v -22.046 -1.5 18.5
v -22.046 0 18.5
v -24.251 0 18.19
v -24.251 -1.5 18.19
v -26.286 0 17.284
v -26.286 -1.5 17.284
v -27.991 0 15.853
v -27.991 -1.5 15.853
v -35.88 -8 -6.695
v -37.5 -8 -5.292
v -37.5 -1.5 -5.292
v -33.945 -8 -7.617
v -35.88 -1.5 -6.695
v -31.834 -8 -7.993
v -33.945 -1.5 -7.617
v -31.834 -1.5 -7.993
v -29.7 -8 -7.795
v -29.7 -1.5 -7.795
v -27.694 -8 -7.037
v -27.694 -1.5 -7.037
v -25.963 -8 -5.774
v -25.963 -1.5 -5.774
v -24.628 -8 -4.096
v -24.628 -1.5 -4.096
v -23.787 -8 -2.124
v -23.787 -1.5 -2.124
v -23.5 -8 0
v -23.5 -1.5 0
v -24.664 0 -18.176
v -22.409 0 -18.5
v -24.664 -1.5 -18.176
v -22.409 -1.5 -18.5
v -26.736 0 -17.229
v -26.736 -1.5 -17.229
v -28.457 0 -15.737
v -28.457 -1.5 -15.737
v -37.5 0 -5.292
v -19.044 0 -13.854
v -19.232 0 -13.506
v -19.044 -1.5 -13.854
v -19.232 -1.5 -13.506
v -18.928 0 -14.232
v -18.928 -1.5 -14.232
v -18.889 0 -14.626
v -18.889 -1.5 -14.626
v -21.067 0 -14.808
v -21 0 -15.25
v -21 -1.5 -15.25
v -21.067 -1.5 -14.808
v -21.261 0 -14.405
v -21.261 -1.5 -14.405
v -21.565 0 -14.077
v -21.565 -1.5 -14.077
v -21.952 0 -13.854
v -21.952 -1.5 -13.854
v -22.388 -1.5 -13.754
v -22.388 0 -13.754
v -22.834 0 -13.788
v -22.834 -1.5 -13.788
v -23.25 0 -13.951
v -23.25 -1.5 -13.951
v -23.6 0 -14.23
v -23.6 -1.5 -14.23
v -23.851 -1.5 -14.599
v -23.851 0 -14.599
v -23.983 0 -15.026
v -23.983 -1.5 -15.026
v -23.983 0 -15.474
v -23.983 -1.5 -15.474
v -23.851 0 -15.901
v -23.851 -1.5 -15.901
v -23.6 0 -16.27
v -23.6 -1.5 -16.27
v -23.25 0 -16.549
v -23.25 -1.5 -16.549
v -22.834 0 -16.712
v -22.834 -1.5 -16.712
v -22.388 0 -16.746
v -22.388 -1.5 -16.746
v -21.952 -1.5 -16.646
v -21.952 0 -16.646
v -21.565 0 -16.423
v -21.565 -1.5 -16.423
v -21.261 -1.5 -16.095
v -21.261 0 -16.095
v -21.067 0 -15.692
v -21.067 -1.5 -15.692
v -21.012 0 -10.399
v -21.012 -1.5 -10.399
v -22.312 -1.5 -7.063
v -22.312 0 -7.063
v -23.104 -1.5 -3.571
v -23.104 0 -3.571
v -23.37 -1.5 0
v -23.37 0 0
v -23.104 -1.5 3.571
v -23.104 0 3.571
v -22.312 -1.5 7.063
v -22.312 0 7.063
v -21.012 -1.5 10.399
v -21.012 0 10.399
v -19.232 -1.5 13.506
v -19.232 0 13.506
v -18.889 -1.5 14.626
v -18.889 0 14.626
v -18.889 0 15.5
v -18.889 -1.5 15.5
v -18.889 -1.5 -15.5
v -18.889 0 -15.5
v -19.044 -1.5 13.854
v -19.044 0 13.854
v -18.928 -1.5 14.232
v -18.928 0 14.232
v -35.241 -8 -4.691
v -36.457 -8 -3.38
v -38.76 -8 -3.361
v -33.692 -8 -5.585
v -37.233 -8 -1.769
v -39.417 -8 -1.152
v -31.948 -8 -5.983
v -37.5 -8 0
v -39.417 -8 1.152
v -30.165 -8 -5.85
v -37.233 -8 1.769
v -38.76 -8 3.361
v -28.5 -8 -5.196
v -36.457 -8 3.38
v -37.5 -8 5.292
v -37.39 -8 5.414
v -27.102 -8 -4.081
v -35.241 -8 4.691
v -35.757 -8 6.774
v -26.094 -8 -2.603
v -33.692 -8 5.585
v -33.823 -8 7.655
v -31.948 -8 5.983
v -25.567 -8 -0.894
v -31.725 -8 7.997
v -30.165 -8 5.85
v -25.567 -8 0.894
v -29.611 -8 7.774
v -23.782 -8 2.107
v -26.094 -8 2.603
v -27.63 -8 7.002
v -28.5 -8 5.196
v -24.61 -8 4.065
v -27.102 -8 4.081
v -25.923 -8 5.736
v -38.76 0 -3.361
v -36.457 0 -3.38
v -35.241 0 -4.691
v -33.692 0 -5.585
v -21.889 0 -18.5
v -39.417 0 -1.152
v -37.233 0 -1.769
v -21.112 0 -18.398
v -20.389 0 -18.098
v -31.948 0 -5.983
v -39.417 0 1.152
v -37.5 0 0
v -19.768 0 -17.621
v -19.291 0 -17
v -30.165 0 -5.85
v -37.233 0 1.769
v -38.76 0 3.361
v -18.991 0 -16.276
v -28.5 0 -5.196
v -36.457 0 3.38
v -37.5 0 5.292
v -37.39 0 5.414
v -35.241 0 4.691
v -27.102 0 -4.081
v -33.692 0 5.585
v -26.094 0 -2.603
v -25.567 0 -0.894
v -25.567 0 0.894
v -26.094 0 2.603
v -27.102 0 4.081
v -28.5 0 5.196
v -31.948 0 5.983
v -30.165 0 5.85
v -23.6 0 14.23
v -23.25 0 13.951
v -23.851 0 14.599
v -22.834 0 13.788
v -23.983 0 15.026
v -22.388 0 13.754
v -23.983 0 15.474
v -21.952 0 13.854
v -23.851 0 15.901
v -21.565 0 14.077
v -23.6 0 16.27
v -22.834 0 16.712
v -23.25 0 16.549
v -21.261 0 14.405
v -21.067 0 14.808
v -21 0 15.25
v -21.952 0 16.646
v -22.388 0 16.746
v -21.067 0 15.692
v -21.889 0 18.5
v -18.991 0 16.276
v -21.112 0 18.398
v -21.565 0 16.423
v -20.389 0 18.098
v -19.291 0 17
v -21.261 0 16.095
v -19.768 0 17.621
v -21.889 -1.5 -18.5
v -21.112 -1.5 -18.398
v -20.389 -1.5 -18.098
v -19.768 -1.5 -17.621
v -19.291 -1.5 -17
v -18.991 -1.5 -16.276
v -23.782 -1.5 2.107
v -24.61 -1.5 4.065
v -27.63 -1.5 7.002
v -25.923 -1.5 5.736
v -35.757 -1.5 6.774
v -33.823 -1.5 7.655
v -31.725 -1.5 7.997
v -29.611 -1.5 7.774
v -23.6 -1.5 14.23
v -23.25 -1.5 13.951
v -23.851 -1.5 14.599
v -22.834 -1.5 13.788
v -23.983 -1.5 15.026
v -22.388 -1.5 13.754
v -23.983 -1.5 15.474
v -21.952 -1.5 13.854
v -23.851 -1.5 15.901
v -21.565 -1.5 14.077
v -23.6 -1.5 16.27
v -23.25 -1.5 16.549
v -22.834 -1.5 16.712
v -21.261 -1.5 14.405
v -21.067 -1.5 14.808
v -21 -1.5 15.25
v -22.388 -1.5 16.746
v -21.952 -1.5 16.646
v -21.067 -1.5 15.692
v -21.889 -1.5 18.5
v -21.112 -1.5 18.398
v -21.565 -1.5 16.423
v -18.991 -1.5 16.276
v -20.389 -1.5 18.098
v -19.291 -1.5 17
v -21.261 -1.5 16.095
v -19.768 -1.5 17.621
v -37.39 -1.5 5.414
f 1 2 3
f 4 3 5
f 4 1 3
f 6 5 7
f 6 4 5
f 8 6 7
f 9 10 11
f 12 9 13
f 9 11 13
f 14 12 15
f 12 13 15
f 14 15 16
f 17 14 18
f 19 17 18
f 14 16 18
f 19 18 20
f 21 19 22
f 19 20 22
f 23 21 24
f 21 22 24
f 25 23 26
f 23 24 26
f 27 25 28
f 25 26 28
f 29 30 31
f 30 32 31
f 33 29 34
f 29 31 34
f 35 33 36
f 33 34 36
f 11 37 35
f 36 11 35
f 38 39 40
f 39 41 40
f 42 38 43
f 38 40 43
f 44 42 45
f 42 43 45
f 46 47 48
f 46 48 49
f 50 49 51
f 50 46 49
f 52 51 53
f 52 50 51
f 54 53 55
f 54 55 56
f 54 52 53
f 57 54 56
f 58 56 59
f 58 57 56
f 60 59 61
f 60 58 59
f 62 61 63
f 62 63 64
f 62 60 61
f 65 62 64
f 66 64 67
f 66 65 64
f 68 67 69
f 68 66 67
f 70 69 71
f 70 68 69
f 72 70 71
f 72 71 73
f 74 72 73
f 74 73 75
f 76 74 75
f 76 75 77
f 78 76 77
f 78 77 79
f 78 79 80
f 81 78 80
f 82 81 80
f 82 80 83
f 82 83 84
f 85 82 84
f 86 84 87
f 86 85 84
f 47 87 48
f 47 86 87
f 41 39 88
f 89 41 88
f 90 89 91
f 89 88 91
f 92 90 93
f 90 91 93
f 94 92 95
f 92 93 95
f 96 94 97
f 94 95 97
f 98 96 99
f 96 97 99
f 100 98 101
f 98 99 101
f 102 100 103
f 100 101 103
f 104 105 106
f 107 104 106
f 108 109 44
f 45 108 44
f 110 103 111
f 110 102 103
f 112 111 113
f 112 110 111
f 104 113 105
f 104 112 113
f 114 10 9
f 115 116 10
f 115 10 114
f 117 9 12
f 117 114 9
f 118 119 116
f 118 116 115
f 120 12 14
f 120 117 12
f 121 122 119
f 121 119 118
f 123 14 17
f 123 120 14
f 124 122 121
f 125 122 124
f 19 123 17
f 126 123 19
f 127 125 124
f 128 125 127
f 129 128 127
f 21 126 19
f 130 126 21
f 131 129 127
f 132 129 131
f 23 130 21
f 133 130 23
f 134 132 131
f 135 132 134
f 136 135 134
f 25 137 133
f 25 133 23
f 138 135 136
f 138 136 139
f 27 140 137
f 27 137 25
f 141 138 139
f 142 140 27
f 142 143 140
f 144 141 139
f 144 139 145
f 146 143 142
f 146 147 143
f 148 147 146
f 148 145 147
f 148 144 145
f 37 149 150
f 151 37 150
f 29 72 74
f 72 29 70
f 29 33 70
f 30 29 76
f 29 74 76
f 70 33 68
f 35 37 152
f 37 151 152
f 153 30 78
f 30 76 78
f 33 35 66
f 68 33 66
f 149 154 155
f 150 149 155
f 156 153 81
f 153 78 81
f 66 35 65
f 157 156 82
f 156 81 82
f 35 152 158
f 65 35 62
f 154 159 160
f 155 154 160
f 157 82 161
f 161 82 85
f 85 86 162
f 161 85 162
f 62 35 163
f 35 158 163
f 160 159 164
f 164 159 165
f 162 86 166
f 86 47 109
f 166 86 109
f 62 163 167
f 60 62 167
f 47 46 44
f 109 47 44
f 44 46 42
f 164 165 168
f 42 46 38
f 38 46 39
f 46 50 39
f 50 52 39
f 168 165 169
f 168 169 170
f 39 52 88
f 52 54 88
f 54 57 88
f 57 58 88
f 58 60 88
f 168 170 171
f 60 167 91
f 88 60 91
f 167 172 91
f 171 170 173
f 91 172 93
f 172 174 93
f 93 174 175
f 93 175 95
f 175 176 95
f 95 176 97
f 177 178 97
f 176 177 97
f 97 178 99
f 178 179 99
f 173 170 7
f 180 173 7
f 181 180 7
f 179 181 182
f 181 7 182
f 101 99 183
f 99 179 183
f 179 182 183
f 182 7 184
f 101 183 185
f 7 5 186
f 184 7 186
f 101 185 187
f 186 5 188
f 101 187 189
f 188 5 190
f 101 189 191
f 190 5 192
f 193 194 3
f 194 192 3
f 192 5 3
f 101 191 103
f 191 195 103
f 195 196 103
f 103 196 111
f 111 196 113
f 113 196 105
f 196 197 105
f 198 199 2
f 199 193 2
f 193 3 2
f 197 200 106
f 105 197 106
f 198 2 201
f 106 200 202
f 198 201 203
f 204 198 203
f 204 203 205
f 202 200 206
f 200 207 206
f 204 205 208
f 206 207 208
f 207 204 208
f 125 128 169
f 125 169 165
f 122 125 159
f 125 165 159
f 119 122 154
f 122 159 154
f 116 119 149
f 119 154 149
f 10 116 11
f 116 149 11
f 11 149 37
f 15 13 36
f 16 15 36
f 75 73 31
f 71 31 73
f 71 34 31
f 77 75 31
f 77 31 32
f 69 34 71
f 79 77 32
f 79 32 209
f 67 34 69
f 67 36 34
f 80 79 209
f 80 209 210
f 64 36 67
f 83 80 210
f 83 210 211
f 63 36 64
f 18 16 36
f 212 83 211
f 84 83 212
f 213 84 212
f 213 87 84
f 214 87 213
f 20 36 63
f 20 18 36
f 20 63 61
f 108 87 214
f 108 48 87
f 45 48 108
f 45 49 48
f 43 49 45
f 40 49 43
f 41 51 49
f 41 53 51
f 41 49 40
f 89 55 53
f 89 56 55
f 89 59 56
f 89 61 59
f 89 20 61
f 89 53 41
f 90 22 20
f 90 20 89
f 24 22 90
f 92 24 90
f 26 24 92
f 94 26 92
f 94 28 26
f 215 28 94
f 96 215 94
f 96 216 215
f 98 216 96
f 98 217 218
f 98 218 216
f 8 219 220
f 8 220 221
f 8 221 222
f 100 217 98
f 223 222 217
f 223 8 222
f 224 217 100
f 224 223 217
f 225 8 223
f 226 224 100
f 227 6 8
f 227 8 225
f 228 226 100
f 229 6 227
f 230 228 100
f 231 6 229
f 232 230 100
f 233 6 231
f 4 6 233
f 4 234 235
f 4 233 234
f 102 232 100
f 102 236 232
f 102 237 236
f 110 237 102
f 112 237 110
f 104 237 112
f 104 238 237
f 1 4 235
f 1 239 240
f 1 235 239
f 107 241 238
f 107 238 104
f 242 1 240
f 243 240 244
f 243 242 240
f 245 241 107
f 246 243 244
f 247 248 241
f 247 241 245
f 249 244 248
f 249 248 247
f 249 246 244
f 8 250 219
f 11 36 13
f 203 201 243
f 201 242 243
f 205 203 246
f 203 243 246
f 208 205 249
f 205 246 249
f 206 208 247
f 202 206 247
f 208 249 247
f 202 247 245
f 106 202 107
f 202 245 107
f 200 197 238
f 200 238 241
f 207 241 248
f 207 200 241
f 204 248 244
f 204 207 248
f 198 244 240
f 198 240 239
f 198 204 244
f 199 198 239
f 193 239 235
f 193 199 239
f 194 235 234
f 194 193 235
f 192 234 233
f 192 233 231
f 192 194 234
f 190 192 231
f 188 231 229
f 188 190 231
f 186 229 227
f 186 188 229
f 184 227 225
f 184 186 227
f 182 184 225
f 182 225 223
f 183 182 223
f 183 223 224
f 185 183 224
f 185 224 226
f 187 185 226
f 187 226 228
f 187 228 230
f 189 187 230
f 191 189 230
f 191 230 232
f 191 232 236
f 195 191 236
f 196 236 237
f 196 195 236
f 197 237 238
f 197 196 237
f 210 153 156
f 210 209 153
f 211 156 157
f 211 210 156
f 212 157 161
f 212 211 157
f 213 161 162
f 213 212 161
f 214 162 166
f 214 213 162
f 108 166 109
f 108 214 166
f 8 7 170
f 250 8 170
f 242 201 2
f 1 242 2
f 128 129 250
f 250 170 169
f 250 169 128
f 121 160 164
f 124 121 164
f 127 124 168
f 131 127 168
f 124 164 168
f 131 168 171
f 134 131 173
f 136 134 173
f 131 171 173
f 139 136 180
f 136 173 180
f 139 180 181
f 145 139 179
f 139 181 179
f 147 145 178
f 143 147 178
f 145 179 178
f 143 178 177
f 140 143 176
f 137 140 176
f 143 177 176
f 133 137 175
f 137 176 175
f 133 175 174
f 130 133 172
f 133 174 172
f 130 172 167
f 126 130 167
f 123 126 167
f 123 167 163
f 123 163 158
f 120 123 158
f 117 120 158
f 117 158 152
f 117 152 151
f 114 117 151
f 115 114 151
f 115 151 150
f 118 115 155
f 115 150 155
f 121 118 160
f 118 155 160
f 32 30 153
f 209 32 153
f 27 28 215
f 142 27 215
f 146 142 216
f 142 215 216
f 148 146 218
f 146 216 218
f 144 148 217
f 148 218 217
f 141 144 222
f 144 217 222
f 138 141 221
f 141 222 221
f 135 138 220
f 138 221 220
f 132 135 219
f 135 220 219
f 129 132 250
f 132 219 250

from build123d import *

# Parameters (mm, degrees)
F0_R     = 1.5
F1_DEPTH = 1.5
F2_DEPTH = 8
F3_R     = 8
F4_R     = 3
F5_R     = 2
F6_R     = 8
F7_R     = 3
F8_R     = 2


with BuildPart() as f1:
    # F0 (on Front) → F1 (new body)
    with BuildSketch(Plane.XZ):
        with BuildLine():
            Line((-26.0642077774, -18.5), (-18.8888516277, -18.5))
            Line((-18.8888516277, -18.5), (-18.8888516277, -14))
            ThreePointArc((-18.8888516277, -14), (-23.3701047123, 0), (-18.8888516277, 14))
            Line((-18.8888516277, 14), (-18.8888516277, 18.5))
            Line((-18.8888516277, 18.5), (-25.6080199033, 18.5))
            Line((-25.6080199033, 18.5), (-37.3901407018, 5.4135240382))
            ThreePointArc((-37.3901407018, 5.4135240382), (-28.5949290555, 7.4538958141), (-23.5, 0))
            ThreePointArc((-23.5, 0), (-28.6715728753, -7.4833147735), (-37.5, -5.2915026221))
            Line((-37.5, -5.2915026221), (-37.5, -5.2920114501))
            Line((-37.5, -5.2920114501), (-26.0642077774, -18.5))
        make_face()
        with Locations((-22.5, -15.25)):
            Circle(F0_R, mode=Mode.SUBTRACT)
        with Locations((-22.5, 15.25)):
            Circle(F0_R, mode=Mode.SUBTRACT)
    extrude(amount=F1_DEPTH)

    # F0 (on Front) → F2 (join)
    with BuildSketch(Plane.XZ):
        with BuildLine():
            Line((-37.5, 0), (-37.5, -5.2915026221))
            ThreePointArc((-37.5, -5.2915026221), (-28.6715728753, -7.4833147735), (-23.5, 0))
            ThreePointArc((-23.5, 0), (-28.5949290555, 7.4538958141), (-37.3901407018, 5.4135240382))
            Line((-37.3901407018, 5.4135240382), (-37.5, 5.2915026221))
            Line((-37.5, 5.2915026221), (-37.5, 0))
        make_face()
        with BuildLine():
            ThreePointArc((-25.5, 0), (-31.5, -6), (-37.5, 0))
            ThreePointArc((-37.5, 0), (-31.5, 6), (-25.5, 0))
        make_face(mode=Mode.SUBTRACT)
        with BuildLine():
            ThreePointArc((-37.5, 5.2915026221), (-39.5, 0), (-37.5, -5.2915026221))
            Line((-37.5, -5.2915026221), (-37.5, 0))
            Line((-37.5, 0), (-37.5, 5.2915026221))
        make_face()
    extrude(amount=F2_DEPTH)

    # F3
    f3_edges = [f1.edges().sort_by_distance(p)[0] for p in [
        (-26.064208, -0.75, -18.5),
    ]]
    fillet(f3_edges, radius=F3_R)

    # F4
    f4_edges = [f1.edges().sort_by_distance(p)[0] for p in [
        (-18.888852, -0.75, -18.5),
    ]]
    fillet(f4_edges, radius=F4_R)

    # F5
    f5_edges = [f1.edges().sort_by_distance(p)[0] for p in [
        (-18.888852, -0.75, 14),
    ]]
    fillet(f5_edges, radius=F5_R)

    # F6
    f6_edges = [f1.edges().sort_by_distance(p)[0] for p in [
        (-25.60802, -0.75, 18.5),
    ]]
    fillet(f6_edges, radius=F6_R)

    # F7
    f7_edges = [f1.edges().sort_by_distance(p)[0] for p in [
        (-18.888852, -0.75, 18.5),
    ]]
    fillet(f7_edges, radius=F7_R)

    # F8
    f8_edges = [f1.edges().sort_by_distance(p)[0] for p in [
        (-18.888852, -0.75, -14),
    ]]
    fillet(f8_edges, radius=F8_R)


solid = f1.part
